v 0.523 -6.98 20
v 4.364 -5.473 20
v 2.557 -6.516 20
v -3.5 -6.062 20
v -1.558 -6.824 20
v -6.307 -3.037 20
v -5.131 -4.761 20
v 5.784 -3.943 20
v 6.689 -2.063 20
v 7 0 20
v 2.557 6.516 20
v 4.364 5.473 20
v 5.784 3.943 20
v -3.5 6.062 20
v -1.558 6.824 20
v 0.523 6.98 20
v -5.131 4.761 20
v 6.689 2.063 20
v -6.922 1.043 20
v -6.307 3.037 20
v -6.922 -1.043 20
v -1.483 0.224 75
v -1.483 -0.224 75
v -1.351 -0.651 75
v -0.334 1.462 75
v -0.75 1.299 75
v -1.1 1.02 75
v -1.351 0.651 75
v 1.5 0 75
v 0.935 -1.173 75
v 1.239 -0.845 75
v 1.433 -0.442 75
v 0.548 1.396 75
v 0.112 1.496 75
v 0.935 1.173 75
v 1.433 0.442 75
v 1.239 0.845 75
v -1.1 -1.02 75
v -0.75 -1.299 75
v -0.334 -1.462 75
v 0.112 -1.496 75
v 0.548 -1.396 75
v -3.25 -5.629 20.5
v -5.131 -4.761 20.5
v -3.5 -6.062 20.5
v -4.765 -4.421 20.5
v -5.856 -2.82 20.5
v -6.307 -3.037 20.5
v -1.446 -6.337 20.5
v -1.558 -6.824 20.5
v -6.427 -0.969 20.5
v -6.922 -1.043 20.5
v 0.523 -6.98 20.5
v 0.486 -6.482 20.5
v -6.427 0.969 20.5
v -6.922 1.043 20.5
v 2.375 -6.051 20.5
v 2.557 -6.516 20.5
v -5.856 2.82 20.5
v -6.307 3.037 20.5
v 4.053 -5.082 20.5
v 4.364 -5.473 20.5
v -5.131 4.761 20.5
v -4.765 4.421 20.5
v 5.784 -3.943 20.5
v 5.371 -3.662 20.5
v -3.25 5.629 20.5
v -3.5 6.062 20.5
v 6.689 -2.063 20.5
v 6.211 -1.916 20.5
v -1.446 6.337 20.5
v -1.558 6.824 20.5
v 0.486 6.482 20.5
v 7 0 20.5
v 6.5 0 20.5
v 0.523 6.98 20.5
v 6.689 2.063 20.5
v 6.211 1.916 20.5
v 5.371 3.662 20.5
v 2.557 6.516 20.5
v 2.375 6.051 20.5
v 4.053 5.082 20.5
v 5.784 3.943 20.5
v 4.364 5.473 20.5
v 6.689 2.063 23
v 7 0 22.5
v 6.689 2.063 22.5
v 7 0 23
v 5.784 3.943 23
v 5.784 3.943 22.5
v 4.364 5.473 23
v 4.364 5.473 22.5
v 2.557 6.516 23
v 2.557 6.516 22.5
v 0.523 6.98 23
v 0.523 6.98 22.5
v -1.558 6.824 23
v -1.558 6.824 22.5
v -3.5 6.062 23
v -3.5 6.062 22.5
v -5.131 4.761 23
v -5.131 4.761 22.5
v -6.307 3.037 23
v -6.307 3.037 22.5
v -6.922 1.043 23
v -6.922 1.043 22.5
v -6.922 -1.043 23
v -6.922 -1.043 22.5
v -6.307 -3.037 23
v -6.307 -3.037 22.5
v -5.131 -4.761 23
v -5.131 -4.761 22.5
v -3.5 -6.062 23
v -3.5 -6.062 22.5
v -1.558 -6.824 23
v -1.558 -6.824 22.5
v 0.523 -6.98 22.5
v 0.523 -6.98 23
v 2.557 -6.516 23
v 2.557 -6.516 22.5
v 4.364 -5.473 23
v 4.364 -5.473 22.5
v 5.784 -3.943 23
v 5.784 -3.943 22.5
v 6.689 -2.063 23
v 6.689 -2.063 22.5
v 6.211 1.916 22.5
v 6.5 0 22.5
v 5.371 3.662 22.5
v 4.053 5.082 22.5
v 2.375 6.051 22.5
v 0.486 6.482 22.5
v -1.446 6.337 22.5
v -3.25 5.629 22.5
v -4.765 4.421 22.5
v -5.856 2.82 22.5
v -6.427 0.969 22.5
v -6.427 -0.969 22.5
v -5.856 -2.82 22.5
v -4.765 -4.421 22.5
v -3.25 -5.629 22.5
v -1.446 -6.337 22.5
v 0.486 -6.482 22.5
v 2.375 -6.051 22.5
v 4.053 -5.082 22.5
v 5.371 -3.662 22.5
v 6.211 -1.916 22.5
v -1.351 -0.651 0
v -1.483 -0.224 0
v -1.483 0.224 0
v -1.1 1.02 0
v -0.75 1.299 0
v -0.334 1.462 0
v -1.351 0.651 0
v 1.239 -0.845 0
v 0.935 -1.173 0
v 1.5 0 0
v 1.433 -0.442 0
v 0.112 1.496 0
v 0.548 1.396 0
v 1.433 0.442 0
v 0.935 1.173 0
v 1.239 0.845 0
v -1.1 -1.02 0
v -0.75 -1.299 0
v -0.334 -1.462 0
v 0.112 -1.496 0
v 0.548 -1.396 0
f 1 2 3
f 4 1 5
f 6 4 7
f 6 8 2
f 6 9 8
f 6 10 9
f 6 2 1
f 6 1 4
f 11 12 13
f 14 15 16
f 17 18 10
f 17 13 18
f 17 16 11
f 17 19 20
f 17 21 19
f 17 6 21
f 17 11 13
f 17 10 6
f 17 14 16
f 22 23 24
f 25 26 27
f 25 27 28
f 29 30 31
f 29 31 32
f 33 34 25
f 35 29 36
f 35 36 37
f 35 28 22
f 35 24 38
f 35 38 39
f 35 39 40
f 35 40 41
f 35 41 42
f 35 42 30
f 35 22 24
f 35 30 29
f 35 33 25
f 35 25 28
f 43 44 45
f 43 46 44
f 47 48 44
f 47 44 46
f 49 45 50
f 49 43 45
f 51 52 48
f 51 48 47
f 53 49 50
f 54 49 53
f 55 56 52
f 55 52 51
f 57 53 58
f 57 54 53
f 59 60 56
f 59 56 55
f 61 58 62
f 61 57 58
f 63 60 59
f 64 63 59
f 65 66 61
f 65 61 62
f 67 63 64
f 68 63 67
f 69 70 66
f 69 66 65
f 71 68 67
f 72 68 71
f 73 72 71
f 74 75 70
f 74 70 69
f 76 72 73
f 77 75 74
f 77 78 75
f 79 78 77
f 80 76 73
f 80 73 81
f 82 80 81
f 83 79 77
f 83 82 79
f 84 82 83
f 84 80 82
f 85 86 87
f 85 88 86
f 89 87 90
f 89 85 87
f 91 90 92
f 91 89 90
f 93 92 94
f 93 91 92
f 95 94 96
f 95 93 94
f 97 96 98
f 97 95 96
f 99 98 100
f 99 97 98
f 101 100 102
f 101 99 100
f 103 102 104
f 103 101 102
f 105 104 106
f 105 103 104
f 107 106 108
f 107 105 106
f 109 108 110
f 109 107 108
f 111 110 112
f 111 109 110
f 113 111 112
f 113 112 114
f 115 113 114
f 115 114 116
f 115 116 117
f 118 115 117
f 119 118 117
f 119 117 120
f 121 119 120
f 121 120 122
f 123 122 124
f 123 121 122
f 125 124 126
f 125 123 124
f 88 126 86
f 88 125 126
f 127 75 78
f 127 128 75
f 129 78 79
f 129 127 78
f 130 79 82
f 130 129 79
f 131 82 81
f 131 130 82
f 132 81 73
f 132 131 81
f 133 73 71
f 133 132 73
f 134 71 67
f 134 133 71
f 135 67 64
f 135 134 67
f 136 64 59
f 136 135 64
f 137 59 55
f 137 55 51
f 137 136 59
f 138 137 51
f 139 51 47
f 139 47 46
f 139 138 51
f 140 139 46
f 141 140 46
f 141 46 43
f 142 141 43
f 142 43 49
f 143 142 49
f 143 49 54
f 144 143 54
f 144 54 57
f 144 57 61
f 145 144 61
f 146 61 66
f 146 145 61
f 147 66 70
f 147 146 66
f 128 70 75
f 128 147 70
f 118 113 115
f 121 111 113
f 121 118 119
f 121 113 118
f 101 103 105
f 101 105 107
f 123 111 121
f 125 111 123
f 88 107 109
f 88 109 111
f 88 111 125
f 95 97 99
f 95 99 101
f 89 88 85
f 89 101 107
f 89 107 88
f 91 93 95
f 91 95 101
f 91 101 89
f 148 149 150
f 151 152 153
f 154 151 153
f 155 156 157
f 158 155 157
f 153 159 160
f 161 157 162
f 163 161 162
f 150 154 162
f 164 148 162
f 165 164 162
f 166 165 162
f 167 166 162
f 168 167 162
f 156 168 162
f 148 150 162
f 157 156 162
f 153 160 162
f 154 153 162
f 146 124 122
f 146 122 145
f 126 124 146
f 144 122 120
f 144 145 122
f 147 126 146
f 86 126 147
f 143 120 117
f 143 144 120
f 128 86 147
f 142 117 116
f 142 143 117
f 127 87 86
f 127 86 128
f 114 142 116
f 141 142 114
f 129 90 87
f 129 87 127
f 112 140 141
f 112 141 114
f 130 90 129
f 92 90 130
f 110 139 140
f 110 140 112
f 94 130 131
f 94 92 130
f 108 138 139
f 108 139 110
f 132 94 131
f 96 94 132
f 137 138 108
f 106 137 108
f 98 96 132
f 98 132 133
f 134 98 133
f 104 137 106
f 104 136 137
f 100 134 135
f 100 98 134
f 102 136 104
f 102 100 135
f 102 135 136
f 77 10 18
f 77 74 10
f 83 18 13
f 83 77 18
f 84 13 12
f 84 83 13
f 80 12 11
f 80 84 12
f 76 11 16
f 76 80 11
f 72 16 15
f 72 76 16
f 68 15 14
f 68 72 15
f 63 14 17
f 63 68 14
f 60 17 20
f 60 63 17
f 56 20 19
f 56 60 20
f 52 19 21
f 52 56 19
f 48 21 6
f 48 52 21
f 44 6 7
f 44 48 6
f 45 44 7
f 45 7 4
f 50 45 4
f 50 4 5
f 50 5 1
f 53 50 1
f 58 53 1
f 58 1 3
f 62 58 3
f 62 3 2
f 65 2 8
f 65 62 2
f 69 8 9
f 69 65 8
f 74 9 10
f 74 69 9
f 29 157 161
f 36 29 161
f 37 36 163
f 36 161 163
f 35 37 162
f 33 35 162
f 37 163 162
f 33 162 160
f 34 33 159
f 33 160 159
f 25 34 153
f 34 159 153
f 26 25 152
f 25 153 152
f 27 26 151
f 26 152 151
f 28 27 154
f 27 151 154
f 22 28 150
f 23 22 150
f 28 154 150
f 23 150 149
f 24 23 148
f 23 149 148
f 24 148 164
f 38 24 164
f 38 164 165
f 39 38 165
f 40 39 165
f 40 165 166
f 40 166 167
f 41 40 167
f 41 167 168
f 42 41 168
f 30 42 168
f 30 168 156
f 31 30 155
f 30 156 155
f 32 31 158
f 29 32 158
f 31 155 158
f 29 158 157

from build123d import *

# Parameters (mm, degrees)
SKETCH1_R           = 1.5
BOSS_EXTRUDE1_DEPTH = 75


with BuildPart() as part:
    # Sketch1 → Boss-Extrude1 (new body)
    with BuildSketch(Plane.XY):
        Circle(SKETCH1_R)
    extrude(amount=BOSS_EXTRUDE1_DEPTH)


with BuildPart() as body_2:
    # Sketch2 → Revolve1 (revolve)
    with BuildSketch(Plane(origin=(0, 0, 0), x_dir=(1, 0, 0), z_dir=(0, 1, 0))):
        Polygon((7, -20), (7, -20.5), (6.5, -20.5), (6.5, -22.5), (7, -22.5), (7, -23), (0, -23), (0, -20), align=None)
    revolve(axis=Axis((0, 0, 20), (0, 0, 1)))


solid = Compound([part.part, body_2.part])
